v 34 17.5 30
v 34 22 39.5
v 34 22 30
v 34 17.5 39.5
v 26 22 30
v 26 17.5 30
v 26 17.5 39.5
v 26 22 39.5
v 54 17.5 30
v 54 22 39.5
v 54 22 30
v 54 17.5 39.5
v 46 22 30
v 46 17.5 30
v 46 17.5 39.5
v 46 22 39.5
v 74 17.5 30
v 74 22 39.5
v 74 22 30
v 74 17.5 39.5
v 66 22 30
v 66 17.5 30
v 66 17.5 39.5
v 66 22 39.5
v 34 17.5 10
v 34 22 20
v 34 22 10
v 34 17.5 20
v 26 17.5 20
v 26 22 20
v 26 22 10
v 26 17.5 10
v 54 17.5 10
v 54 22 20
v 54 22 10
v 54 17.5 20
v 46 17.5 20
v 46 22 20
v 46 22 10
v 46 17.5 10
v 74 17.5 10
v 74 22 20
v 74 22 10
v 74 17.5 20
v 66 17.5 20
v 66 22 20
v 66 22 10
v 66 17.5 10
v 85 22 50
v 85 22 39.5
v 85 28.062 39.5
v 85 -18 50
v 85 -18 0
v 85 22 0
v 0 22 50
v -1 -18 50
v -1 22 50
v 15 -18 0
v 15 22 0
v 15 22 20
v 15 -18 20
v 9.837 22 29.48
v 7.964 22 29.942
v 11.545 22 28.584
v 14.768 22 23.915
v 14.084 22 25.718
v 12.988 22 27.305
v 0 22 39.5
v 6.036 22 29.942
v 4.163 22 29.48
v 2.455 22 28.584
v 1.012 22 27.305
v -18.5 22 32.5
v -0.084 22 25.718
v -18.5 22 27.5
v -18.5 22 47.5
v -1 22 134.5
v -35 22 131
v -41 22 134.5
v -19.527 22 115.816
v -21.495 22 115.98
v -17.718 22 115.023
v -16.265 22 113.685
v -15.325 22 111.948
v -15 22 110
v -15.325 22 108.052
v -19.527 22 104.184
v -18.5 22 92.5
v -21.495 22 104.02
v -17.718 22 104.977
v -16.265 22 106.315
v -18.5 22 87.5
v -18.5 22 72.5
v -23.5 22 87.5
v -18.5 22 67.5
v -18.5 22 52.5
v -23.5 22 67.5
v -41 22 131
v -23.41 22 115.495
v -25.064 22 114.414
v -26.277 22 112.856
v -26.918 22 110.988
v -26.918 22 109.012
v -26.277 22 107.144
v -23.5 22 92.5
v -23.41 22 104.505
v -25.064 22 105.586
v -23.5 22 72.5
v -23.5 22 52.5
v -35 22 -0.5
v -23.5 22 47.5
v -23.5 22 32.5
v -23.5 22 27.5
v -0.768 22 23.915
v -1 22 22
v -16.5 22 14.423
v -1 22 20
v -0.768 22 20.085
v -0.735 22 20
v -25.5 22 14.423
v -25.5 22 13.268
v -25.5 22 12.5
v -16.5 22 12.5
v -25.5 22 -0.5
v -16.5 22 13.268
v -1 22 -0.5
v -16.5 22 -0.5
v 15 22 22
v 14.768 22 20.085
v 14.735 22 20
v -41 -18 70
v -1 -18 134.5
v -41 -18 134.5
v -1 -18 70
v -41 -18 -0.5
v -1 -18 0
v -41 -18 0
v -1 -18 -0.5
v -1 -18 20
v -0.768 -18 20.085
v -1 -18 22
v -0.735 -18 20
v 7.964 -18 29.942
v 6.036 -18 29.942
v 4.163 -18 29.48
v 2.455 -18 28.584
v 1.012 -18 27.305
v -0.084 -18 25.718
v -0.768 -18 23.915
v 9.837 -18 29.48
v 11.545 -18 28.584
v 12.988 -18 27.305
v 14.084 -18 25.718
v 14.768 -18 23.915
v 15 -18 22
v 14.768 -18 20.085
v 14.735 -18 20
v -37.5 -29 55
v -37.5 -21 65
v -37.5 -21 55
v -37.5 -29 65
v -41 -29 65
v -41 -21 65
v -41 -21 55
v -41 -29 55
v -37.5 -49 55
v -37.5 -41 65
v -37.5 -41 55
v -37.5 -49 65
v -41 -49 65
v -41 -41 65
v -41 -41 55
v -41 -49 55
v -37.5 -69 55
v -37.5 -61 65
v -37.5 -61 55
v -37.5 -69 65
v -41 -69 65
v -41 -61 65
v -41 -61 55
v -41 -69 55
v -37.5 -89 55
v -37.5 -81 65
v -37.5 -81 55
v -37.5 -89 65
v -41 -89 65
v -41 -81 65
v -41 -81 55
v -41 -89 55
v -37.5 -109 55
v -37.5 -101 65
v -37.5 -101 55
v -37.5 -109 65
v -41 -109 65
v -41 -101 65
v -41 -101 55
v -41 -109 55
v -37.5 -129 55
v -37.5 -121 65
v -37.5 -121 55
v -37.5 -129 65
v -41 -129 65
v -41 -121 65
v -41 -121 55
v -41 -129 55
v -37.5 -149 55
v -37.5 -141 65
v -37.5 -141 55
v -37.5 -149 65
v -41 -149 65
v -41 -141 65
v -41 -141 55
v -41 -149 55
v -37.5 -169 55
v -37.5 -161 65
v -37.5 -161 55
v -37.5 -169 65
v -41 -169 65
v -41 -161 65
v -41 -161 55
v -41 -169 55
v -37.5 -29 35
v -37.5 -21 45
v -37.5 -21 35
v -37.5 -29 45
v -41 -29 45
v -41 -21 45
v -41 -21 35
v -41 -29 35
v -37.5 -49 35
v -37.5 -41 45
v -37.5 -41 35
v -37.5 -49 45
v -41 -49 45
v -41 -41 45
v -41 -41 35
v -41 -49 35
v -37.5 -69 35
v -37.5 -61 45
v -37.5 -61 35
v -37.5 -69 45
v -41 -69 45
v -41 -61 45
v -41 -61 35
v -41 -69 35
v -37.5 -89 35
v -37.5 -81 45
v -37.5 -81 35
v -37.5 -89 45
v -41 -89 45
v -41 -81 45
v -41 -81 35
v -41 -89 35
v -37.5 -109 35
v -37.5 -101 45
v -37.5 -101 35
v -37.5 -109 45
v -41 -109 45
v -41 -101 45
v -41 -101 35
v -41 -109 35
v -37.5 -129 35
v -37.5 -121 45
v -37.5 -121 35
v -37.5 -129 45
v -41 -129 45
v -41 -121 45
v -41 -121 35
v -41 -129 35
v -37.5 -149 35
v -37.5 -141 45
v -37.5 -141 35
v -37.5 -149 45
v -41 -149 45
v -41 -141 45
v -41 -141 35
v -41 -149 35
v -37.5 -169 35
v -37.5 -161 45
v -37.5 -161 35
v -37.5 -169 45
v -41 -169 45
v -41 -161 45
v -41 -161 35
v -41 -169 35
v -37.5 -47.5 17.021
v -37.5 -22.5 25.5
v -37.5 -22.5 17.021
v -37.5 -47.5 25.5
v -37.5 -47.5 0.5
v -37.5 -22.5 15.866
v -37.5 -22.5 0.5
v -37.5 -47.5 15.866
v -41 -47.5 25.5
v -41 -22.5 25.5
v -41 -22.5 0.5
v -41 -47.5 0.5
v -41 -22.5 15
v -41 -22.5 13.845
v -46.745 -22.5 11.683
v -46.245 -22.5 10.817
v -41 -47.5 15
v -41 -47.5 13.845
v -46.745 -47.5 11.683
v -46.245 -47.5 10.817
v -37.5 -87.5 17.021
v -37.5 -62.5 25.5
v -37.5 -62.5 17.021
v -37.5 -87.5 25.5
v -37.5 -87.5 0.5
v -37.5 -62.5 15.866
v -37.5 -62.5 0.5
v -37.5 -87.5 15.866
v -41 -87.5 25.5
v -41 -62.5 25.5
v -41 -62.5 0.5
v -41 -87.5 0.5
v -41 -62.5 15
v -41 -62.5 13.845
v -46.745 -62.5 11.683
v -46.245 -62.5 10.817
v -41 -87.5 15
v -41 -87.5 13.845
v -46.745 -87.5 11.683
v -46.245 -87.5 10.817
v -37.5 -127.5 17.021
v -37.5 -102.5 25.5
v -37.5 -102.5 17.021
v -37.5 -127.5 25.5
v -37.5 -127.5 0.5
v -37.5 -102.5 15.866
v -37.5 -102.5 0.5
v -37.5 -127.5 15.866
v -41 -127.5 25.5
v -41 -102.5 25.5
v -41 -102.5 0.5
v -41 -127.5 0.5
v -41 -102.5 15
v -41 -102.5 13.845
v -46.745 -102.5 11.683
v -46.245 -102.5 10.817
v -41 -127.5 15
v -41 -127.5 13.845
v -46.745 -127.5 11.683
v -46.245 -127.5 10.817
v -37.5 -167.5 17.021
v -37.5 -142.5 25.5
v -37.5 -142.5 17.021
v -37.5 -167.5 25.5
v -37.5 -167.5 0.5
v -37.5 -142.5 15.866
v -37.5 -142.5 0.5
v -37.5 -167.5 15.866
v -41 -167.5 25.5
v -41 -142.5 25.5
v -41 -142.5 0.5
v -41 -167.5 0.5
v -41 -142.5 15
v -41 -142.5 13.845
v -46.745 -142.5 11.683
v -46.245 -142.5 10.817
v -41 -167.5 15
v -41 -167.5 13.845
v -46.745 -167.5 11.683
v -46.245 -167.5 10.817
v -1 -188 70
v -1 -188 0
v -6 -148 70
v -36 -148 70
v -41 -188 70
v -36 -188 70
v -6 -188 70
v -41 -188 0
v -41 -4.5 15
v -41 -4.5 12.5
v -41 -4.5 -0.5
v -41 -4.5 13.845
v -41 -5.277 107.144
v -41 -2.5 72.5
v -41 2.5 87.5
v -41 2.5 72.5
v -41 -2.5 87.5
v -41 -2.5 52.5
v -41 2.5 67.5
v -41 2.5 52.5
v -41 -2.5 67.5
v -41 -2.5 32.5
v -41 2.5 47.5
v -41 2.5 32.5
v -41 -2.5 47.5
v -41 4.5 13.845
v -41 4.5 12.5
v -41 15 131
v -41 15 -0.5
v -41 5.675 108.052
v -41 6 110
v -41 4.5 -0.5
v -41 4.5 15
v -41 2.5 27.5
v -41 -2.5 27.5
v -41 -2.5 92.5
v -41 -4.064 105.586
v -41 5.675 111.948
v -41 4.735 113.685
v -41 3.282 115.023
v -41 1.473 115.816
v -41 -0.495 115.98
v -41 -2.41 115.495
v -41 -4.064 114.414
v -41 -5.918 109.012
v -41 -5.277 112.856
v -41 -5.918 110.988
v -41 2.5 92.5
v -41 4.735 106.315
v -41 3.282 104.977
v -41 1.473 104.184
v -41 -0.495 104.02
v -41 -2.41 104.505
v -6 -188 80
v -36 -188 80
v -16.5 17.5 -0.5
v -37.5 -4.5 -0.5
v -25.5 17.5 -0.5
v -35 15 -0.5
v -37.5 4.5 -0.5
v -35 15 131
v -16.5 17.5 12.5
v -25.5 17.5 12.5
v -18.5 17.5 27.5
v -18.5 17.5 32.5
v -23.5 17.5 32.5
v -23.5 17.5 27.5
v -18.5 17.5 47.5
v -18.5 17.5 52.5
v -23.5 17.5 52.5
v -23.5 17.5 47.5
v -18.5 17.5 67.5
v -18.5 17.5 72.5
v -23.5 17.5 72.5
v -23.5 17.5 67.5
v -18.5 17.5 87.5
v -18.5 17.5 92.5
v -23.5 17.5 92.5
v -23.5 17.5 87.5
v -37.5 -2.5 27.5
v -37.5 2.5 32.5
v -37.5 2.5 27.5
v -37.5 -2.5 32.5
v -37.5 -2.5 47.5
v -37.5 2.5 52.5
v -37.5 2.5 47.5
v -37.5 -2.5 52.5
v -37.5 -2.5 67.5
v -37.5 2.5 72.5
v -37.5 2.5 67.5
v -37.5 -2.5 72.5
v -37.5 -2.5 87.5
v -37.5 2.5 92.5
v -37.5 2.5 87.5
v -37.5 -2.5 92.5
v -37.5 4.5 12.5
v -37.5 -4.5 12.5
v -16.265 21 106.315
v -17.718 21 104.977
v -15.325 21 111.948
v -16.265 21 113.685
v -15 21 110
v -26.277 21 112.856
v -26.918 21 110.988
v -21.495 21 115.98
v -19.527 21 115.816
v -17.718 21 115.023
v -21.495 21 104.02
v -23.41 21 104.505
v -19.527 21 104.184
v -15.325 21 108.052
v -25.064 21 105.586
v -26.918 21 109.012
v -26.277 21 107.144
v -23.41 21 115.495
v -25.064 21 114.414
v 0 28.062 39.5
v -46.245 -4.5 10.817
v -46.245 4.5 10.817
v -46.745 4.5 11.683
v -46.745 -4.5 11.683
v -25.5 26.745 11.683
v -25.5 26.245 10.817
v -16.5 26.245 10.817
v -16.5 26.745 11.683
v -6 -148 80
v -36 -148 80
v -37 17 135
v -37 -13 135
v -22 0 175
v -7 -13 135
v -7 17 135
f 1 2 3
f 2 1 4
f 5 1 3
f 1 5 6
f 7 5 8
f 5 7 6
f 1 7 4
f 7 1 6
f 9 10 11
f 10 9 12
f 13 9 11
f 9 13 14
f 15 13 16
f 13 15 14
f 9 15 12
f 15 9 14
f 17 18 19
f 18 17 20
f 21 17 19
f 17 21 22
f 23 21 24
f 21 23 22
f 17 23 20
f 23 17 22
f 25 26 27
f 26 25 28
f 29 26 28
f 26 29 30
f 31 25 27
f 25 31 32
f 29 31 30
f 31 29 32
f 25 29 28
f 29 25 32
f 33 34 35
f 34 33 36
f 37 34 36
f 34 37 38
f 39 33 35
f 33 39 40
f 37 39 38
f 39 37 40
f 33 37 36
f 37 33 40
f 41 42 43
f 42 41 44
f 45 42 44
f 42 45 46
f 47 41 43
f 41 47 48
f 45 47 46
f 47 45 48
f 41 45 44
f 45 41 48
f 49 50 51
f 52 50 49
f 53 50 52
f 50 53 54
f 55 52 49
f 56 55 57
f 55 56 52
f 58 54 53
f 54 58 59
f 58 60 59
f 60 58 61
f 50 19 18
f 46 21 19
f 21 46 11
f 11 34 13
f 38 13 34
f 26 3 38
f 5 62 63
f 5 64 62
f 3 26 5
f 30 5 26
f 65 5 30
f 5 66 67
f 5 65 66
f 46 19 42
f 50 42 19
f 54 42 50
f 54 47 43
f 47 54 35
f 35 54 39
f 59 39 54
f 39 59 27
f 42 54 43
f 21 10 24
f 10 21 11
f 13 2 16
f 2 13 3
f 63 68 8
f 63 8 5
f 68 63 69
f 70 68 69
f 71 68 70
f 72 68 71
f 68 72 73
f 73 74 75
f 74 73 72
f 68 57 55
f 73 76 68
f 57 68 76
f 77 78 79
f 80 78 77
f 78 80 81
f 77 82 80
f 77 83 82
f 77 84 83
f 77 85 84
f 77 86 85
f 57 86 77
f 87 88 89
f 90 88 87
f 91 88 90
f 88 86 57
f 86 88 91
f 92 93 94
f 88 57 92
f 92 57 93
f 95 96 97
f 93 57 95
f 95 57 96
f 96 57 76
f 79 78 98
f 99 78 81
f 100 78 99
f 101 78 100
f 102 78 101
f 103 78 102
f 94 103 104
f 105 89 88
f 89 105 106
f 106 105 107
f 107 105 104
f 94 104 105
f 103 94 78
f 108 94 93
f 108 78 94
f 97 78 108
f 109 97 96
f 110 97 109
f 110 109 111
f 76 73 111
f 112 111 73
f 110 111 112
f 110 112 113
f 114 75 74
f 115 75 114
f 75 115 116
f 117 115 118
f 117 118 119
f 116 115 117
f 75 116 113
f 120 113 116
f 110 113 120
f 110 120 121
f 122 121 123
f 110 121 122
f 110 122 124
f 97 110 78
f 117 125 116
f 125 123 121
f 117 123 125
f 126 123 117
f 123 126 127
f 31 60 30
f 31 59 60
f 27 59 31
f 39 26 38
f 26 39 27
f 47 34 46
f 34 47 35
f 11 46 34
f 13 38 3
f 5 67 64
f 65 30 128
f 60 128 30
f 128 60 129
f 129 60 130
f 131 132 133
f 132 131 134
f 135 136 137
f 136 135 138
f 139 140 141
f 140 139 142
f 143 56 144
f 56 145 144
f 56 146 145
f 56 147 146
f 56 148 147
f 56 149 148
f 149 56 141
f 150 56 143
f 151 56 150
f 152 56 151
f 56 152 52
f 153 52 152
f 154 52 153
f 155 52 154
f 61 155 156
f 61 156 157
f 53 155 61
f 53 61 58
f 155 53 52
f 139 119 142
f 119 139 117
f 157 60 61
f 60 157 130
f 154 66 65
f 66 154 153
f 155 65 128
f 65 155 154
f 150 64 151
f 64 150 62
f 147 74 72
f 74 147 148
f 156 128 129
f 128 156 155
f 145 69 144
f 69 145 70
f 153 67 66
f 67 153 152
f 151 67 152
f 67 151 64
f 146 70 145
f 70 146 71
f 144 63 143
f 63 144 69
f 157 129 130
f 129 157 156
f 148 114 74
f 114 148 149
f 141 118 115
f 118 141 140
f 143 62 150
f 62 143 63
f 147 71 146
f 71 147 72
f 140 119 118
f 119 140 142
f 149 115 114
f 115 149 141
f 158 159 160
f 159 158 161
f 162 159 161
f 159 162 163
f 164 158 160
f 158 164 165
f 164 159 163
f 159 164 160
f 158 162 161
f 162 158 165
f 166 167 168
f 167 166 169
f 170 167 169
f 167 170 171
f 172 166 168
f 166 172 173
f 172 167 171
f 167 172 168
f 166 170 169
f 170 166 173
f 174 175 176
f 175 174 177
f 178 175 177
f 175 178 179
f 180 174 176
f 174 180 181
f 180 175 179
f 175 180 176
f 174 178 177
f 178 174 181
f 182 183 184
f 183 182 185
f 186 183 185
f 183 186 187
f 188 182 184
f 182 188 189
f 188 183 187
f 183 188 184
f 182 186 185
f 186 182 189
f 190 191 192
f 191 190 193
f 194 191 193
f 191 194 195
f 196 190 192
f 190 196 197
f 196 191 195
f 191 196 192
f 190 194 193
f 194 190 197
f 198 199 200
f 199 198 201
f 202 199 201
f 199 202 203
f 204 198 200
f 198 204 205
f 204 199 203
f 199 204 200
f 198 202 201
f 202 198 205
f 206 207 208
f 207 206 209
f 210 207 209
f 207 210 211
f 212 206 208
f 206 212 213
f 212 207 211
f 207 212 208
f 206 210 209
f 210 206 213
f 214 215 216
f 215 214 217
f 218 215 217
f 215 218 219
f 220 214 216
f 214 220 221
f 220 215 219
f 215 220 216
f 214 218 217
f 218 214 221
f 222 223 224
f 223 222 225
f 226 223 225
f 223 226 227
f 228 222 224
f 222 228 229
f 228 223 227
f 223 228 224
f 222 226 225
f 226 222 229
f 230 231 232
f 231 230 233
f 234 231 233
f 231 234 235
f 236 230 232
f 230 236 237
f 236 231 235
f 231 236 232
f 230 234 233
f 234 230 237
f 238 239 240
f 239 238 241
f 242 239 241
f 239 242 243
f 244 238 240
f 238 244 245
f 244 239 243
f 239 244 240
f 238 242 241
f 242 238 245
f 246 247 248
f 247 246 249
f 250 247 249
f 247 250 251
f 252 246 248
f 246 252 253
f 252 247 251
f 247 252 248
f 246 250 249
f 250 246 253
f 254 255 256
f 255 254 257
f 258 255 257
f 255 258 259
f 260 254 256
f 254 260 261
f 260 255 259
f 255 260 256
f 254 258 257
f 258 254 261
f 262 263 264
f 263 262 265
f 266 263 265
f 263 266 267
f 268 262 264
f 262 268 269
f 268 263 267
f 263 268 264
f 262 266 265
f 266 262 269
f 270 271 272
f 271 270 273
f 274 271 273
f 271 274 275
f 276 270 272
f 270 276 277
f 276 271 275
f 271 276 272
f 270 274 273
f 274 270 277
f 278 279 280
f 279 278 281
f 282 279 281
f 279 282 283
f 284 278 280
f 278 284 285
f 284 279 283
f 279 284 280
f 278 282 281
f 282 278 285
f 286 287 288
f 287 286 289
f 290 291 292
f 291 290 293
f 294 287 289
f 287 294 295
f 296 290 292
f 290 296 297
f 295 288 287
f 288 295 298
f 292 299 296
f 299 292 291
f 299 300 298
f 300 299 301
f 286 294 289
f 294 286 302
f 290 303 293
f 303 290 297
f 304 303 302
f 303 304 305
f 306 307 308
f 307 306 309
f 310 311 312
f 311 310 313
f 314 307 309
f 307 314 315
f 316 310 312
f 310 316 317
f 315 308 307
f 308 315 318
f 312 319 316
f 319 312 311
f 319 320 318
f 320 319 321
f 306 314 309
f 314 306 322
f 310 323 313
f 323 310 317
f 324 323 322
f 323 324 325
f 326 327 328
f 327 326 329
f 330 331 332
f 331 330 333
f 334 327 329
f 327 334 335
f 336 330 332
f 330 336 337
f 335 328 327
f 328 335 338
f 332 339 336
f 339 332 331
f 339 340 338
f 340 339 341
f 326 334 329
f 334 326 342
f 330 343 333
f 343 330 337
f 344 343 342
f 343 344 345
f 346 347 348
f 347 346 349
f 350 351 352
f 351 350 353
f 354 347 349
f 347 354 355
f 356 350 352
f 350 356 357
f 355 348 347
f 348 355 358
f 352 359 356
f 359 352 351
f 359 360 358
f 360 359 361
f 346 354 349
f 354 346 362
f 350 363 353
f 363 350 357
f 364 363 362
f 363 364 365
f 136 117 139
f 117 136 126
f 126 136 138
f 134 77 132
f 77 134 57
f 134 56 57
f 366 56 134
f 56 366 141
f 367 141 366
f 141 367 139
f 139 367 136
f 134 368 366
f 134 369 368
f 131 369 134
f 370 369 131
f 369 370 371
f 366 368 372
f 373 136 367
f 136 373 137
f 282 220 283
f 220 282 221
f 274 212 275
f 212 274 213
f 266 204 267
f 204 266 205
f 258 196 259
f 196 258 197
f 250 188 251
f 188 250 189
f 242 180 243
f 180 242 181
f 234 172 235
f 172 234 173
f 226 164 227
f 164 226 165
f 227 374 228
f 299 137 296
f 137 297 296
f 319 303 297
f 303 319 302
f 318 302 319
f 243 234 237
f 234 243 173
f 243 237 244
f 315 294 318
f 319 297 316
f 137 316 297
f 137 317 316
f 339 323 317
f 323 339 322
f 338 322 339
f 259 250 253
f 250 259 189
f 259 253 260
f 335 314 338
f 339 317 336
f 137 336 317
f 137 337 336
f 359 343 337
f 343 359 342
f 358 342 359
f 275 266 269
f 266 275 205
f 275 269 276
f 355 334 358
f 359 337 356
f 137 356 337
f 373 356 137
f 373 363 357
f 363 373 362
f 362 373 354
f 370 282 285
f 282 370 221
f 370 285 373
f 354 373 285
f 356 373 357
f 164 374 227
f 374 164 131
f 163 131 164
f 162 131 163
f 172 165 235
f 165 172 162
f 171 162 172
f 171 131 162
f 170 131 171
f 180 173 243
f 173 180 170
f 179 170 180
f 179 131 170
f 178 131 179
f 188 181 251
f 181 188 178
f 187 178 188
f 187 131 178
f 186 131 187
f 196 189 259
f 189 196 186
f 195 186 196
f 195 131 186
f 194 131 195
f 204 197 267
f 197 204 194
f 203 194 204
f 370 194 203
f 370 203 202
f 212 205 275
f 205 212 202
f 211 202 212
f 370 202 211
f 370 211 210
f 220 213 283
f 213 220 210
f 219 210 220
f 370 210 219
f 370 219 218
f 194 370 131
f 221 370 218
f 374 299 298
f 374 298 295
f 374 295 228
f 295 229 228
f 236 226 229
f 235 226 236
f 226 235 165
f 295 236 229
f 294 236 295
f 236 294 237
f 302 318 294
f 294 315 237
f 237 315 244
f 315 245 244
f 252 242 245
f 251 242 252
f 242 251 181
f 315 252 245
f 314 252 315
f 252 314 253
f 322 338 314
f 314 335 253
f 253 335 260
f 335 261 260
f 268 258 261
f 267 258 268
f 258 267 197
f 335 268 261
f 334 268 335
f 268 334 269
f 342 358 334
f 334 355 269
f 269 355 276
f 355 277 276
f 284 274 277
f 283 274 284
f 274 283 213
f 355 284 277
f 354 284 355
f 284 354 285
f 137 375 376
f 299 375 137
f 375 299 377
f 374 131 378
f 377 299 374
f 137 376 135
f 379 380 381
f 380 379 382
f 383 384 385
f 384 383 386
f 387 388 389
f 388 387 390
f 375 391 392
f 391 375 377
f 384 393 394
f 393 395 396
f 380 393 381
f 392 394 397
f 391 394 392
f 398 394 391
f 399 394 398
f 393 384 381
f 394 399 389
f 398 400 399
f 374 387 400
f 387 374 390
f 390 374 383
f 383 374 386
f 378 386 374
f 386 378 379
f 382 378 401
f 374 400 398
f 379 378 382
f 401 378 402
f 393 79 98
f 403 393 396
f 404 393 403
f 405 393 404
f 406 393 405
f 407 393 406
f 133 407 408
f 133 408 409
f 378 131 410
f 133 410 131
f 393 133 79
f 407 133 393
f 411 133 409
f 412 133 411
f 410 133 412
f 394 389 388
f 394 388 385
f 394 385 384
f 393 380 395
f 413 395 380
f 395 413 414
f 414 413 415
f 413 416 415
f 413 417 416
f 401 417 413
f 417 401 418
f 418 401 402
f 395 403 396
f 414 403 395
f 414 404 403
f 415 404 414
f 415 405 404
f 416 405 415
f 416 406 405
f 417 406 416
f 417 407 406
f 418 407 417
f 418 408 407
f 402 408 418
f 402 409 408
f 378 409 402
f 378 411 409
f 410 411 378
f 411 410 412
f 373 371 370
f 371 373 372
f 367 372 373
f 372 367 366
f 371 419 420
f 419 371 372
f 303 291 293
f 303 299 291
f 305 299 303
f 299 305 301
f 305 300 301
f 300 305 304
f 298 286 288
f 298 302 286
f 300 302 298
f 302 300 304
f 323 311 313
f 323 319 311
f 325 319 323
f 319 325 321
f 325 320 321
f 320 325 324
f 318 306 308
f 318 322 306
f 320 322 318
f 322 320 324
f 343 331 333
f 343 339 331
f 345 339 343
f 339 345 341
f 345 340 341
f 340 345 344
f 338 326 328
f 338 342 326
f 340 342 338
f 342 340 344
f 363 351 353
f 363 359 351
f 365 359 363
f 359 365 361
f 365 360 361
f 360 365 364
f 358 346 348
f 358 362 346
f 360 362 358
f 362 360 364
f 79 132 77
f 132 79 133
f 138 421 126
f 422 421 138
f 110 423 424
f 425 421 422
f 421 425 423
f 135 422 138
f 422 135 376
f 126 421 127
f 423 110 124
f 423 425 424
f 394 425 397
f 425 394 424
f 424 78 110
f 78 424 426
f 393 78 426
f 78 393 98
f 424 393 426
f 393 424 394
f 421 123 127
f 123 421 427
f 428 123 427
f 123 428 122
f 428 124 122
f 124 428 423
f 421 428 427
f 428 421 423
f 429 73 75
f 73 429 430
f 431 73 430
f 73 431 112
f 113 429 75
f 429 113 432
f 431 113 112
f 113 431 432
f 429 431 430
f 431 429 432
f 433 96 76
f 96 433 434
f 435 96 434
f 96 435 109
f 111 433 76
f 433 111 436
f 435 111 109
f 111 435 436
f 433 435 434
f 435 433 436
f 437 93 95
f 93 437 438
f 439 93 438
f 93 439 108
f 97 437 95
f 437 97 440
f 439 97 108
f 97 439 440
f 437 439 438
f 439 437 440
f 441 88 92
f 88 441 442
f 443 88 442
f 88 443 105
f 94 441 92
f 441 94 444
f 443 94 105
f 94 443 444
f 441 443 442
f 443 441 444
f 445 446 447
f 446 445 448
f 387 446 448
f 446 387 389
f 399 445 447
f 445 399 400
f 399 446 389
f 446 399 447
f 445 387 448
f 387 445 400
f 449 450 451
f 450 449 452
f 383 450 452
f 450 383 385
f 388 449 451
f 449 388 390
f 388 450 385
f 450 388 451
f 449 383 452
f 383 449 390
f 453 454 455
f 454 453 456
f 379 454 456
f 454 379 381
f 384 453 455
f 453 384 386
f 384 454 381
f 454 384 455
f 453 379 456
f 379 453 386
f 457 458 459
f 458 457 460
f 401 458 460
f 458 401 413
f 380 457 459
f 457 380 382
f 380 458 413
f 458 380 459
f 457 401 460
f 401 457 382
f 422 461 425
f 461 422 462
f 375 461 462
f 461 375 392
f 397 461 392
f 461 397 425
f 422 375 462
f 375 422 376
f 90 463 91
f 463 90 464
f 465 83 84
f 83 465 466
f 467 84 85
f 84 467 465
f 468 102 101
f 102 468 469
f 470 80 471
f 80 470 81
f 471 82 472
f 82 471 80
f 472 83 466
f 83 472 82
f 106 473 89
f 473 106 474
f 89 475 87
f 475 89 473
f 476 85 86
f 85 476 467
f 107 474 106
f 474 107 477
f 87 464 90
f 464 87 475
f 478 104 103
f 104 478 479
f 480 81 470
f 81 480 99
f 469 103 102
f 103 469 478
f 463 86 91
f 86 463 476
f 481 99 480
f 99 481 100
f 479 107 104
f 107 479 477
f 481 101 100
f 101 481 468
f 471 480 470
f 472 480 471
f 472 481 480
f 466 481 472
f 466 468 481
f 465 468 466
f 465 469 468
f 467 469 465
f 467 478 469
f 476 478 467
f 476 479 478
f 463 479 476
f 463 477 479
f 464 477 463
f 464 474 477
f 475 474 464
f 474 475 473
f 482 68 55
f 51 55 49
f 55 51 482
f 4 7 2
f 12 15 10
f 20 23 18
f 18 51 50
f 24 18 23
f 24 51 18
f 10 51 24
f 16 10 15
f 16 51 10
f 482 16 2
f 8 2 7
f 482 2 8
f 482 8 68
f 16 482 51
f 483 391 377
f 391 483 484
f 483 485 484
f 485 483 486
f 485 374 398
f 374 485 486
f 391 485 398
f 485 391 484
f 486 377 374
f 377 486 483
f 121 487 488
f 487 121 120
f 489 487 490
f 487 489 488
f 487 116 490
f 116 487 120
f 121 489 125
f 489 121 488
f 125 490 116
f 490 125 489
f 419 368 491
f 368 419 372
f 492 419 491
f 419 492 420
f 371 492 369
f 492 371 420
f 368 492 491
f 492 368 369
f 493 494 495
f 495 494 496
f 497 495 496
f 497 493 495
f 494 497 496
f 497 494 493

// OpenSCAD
 //левая стенка(1)
 difference() {
 translate([50,2,25]) {
 cube([70,40,50],true);
 }
for(j = [30:20:80]){
translate([j,20,35]) { cube([8,5,10],true);}}
for(j = [30:20:80]){
translate([j,20,15]) { cube([8,5,10],true);}}
}
//левая стенка(2)
 difference() {
  translate([7,2,25]) {
 cube([17,40,50],true);
 }
 translate([7,2,0]) {
 cube([17,40,40],true);
 }
 {rotate([90,0,0]) 
 translate([7,22,-22])
 cylinder(h=50, r1=8, r2=8);}
 }
 //правая
 difference() {
 translate([-21,-103,35]){ 
 cube([40,170,70],true);
 }
 for(j = [-25:-20:-180]){
translate([-40,j,60]) { cube([5,8,10],true);}}
for(j = [-25:-20:-180]){
translate([-40,j,40]) { cube([5,8,10],true);}}
for(j = [-35:-40:-180]){
translate([-40,j,13]) { cube([5,25,25],true);}}
 }
 //навесы
 for(j = [-35:-40:-180]){
 translate([-40,j,15]) 
 rotate([0,60,0])
 cube([1,25,15],true);
 }
 hull() {
 translate([84,22,43])
rotate([90,30,90])
cylinder(1,7,7,$fn=3);
translate([0,22,43])
rotate([90,30,90])
cylinder(1,7,7,$fn=3);
}
translate([-40,0,15]) 
 rotate([0,60,0])
 cube([1,9,15],true);
translate([-21,20,15]) 
 rotate([60,0,0])
 cube([9,1,15],true);

 //центр
 difference() {
 translate([-21,2,67]) {
 cube([40,40,135],true);
 } 
  translate([-40,20,65]) {
 cube([10,10,132],true);
 }
 //окна и двери(1)
 translate([-21,20,5]) { cube([9,5,15],true);}
 translate([-21,20,30]) { cube([5,5,5],true);}
 translate([-21,20,50]) { cube([5,5,5],true);}
 translate([-21,20,70]) { cube([5,5,5],true);}
 translate([-21,20,90]) { cube([5,5,5],true);}
 //окна и двери(2)
 translate([-40,0,30]) { cube([5,5,5],true);}
 translate([-40,0,50]) { cube([5,5,5],true);}
 translate([-40,0,70]) { cube([5,5,5],true);}
 translate([-40,0,90]) { cube([5,5,5],true);}
 translate([-40,0,5]) { cube([5,9,15],true);
 }
//часы
{rotate([90,0,0]) 
translate([-21,110,-25])
cylinder(h=4, r1=6, r2=6);
}
{rotate([90,0,90]) 
translate([0,110,-45])
cylinder(h=4, r1=6, r2=6);
 }
}
//правая вершина
translate([-21,-168,45]) {
 cube([30,40,70],true);
}
// центр. вершина
polyhedron(

        points=[ [-37,17,135],[-37,-13,135],[-7,-13,135],[-7,17,135], // четыре точки , основания пирамиды
    [-22,0,175]  ], // точка вершины
    faces=[ [0,1,4],[1,2,4],[2,3,4],[3,0,4],       // формирование боковых плоскостей 
    [1,0,3],[2,1,3] ]  // формирование плоскости основания
);
